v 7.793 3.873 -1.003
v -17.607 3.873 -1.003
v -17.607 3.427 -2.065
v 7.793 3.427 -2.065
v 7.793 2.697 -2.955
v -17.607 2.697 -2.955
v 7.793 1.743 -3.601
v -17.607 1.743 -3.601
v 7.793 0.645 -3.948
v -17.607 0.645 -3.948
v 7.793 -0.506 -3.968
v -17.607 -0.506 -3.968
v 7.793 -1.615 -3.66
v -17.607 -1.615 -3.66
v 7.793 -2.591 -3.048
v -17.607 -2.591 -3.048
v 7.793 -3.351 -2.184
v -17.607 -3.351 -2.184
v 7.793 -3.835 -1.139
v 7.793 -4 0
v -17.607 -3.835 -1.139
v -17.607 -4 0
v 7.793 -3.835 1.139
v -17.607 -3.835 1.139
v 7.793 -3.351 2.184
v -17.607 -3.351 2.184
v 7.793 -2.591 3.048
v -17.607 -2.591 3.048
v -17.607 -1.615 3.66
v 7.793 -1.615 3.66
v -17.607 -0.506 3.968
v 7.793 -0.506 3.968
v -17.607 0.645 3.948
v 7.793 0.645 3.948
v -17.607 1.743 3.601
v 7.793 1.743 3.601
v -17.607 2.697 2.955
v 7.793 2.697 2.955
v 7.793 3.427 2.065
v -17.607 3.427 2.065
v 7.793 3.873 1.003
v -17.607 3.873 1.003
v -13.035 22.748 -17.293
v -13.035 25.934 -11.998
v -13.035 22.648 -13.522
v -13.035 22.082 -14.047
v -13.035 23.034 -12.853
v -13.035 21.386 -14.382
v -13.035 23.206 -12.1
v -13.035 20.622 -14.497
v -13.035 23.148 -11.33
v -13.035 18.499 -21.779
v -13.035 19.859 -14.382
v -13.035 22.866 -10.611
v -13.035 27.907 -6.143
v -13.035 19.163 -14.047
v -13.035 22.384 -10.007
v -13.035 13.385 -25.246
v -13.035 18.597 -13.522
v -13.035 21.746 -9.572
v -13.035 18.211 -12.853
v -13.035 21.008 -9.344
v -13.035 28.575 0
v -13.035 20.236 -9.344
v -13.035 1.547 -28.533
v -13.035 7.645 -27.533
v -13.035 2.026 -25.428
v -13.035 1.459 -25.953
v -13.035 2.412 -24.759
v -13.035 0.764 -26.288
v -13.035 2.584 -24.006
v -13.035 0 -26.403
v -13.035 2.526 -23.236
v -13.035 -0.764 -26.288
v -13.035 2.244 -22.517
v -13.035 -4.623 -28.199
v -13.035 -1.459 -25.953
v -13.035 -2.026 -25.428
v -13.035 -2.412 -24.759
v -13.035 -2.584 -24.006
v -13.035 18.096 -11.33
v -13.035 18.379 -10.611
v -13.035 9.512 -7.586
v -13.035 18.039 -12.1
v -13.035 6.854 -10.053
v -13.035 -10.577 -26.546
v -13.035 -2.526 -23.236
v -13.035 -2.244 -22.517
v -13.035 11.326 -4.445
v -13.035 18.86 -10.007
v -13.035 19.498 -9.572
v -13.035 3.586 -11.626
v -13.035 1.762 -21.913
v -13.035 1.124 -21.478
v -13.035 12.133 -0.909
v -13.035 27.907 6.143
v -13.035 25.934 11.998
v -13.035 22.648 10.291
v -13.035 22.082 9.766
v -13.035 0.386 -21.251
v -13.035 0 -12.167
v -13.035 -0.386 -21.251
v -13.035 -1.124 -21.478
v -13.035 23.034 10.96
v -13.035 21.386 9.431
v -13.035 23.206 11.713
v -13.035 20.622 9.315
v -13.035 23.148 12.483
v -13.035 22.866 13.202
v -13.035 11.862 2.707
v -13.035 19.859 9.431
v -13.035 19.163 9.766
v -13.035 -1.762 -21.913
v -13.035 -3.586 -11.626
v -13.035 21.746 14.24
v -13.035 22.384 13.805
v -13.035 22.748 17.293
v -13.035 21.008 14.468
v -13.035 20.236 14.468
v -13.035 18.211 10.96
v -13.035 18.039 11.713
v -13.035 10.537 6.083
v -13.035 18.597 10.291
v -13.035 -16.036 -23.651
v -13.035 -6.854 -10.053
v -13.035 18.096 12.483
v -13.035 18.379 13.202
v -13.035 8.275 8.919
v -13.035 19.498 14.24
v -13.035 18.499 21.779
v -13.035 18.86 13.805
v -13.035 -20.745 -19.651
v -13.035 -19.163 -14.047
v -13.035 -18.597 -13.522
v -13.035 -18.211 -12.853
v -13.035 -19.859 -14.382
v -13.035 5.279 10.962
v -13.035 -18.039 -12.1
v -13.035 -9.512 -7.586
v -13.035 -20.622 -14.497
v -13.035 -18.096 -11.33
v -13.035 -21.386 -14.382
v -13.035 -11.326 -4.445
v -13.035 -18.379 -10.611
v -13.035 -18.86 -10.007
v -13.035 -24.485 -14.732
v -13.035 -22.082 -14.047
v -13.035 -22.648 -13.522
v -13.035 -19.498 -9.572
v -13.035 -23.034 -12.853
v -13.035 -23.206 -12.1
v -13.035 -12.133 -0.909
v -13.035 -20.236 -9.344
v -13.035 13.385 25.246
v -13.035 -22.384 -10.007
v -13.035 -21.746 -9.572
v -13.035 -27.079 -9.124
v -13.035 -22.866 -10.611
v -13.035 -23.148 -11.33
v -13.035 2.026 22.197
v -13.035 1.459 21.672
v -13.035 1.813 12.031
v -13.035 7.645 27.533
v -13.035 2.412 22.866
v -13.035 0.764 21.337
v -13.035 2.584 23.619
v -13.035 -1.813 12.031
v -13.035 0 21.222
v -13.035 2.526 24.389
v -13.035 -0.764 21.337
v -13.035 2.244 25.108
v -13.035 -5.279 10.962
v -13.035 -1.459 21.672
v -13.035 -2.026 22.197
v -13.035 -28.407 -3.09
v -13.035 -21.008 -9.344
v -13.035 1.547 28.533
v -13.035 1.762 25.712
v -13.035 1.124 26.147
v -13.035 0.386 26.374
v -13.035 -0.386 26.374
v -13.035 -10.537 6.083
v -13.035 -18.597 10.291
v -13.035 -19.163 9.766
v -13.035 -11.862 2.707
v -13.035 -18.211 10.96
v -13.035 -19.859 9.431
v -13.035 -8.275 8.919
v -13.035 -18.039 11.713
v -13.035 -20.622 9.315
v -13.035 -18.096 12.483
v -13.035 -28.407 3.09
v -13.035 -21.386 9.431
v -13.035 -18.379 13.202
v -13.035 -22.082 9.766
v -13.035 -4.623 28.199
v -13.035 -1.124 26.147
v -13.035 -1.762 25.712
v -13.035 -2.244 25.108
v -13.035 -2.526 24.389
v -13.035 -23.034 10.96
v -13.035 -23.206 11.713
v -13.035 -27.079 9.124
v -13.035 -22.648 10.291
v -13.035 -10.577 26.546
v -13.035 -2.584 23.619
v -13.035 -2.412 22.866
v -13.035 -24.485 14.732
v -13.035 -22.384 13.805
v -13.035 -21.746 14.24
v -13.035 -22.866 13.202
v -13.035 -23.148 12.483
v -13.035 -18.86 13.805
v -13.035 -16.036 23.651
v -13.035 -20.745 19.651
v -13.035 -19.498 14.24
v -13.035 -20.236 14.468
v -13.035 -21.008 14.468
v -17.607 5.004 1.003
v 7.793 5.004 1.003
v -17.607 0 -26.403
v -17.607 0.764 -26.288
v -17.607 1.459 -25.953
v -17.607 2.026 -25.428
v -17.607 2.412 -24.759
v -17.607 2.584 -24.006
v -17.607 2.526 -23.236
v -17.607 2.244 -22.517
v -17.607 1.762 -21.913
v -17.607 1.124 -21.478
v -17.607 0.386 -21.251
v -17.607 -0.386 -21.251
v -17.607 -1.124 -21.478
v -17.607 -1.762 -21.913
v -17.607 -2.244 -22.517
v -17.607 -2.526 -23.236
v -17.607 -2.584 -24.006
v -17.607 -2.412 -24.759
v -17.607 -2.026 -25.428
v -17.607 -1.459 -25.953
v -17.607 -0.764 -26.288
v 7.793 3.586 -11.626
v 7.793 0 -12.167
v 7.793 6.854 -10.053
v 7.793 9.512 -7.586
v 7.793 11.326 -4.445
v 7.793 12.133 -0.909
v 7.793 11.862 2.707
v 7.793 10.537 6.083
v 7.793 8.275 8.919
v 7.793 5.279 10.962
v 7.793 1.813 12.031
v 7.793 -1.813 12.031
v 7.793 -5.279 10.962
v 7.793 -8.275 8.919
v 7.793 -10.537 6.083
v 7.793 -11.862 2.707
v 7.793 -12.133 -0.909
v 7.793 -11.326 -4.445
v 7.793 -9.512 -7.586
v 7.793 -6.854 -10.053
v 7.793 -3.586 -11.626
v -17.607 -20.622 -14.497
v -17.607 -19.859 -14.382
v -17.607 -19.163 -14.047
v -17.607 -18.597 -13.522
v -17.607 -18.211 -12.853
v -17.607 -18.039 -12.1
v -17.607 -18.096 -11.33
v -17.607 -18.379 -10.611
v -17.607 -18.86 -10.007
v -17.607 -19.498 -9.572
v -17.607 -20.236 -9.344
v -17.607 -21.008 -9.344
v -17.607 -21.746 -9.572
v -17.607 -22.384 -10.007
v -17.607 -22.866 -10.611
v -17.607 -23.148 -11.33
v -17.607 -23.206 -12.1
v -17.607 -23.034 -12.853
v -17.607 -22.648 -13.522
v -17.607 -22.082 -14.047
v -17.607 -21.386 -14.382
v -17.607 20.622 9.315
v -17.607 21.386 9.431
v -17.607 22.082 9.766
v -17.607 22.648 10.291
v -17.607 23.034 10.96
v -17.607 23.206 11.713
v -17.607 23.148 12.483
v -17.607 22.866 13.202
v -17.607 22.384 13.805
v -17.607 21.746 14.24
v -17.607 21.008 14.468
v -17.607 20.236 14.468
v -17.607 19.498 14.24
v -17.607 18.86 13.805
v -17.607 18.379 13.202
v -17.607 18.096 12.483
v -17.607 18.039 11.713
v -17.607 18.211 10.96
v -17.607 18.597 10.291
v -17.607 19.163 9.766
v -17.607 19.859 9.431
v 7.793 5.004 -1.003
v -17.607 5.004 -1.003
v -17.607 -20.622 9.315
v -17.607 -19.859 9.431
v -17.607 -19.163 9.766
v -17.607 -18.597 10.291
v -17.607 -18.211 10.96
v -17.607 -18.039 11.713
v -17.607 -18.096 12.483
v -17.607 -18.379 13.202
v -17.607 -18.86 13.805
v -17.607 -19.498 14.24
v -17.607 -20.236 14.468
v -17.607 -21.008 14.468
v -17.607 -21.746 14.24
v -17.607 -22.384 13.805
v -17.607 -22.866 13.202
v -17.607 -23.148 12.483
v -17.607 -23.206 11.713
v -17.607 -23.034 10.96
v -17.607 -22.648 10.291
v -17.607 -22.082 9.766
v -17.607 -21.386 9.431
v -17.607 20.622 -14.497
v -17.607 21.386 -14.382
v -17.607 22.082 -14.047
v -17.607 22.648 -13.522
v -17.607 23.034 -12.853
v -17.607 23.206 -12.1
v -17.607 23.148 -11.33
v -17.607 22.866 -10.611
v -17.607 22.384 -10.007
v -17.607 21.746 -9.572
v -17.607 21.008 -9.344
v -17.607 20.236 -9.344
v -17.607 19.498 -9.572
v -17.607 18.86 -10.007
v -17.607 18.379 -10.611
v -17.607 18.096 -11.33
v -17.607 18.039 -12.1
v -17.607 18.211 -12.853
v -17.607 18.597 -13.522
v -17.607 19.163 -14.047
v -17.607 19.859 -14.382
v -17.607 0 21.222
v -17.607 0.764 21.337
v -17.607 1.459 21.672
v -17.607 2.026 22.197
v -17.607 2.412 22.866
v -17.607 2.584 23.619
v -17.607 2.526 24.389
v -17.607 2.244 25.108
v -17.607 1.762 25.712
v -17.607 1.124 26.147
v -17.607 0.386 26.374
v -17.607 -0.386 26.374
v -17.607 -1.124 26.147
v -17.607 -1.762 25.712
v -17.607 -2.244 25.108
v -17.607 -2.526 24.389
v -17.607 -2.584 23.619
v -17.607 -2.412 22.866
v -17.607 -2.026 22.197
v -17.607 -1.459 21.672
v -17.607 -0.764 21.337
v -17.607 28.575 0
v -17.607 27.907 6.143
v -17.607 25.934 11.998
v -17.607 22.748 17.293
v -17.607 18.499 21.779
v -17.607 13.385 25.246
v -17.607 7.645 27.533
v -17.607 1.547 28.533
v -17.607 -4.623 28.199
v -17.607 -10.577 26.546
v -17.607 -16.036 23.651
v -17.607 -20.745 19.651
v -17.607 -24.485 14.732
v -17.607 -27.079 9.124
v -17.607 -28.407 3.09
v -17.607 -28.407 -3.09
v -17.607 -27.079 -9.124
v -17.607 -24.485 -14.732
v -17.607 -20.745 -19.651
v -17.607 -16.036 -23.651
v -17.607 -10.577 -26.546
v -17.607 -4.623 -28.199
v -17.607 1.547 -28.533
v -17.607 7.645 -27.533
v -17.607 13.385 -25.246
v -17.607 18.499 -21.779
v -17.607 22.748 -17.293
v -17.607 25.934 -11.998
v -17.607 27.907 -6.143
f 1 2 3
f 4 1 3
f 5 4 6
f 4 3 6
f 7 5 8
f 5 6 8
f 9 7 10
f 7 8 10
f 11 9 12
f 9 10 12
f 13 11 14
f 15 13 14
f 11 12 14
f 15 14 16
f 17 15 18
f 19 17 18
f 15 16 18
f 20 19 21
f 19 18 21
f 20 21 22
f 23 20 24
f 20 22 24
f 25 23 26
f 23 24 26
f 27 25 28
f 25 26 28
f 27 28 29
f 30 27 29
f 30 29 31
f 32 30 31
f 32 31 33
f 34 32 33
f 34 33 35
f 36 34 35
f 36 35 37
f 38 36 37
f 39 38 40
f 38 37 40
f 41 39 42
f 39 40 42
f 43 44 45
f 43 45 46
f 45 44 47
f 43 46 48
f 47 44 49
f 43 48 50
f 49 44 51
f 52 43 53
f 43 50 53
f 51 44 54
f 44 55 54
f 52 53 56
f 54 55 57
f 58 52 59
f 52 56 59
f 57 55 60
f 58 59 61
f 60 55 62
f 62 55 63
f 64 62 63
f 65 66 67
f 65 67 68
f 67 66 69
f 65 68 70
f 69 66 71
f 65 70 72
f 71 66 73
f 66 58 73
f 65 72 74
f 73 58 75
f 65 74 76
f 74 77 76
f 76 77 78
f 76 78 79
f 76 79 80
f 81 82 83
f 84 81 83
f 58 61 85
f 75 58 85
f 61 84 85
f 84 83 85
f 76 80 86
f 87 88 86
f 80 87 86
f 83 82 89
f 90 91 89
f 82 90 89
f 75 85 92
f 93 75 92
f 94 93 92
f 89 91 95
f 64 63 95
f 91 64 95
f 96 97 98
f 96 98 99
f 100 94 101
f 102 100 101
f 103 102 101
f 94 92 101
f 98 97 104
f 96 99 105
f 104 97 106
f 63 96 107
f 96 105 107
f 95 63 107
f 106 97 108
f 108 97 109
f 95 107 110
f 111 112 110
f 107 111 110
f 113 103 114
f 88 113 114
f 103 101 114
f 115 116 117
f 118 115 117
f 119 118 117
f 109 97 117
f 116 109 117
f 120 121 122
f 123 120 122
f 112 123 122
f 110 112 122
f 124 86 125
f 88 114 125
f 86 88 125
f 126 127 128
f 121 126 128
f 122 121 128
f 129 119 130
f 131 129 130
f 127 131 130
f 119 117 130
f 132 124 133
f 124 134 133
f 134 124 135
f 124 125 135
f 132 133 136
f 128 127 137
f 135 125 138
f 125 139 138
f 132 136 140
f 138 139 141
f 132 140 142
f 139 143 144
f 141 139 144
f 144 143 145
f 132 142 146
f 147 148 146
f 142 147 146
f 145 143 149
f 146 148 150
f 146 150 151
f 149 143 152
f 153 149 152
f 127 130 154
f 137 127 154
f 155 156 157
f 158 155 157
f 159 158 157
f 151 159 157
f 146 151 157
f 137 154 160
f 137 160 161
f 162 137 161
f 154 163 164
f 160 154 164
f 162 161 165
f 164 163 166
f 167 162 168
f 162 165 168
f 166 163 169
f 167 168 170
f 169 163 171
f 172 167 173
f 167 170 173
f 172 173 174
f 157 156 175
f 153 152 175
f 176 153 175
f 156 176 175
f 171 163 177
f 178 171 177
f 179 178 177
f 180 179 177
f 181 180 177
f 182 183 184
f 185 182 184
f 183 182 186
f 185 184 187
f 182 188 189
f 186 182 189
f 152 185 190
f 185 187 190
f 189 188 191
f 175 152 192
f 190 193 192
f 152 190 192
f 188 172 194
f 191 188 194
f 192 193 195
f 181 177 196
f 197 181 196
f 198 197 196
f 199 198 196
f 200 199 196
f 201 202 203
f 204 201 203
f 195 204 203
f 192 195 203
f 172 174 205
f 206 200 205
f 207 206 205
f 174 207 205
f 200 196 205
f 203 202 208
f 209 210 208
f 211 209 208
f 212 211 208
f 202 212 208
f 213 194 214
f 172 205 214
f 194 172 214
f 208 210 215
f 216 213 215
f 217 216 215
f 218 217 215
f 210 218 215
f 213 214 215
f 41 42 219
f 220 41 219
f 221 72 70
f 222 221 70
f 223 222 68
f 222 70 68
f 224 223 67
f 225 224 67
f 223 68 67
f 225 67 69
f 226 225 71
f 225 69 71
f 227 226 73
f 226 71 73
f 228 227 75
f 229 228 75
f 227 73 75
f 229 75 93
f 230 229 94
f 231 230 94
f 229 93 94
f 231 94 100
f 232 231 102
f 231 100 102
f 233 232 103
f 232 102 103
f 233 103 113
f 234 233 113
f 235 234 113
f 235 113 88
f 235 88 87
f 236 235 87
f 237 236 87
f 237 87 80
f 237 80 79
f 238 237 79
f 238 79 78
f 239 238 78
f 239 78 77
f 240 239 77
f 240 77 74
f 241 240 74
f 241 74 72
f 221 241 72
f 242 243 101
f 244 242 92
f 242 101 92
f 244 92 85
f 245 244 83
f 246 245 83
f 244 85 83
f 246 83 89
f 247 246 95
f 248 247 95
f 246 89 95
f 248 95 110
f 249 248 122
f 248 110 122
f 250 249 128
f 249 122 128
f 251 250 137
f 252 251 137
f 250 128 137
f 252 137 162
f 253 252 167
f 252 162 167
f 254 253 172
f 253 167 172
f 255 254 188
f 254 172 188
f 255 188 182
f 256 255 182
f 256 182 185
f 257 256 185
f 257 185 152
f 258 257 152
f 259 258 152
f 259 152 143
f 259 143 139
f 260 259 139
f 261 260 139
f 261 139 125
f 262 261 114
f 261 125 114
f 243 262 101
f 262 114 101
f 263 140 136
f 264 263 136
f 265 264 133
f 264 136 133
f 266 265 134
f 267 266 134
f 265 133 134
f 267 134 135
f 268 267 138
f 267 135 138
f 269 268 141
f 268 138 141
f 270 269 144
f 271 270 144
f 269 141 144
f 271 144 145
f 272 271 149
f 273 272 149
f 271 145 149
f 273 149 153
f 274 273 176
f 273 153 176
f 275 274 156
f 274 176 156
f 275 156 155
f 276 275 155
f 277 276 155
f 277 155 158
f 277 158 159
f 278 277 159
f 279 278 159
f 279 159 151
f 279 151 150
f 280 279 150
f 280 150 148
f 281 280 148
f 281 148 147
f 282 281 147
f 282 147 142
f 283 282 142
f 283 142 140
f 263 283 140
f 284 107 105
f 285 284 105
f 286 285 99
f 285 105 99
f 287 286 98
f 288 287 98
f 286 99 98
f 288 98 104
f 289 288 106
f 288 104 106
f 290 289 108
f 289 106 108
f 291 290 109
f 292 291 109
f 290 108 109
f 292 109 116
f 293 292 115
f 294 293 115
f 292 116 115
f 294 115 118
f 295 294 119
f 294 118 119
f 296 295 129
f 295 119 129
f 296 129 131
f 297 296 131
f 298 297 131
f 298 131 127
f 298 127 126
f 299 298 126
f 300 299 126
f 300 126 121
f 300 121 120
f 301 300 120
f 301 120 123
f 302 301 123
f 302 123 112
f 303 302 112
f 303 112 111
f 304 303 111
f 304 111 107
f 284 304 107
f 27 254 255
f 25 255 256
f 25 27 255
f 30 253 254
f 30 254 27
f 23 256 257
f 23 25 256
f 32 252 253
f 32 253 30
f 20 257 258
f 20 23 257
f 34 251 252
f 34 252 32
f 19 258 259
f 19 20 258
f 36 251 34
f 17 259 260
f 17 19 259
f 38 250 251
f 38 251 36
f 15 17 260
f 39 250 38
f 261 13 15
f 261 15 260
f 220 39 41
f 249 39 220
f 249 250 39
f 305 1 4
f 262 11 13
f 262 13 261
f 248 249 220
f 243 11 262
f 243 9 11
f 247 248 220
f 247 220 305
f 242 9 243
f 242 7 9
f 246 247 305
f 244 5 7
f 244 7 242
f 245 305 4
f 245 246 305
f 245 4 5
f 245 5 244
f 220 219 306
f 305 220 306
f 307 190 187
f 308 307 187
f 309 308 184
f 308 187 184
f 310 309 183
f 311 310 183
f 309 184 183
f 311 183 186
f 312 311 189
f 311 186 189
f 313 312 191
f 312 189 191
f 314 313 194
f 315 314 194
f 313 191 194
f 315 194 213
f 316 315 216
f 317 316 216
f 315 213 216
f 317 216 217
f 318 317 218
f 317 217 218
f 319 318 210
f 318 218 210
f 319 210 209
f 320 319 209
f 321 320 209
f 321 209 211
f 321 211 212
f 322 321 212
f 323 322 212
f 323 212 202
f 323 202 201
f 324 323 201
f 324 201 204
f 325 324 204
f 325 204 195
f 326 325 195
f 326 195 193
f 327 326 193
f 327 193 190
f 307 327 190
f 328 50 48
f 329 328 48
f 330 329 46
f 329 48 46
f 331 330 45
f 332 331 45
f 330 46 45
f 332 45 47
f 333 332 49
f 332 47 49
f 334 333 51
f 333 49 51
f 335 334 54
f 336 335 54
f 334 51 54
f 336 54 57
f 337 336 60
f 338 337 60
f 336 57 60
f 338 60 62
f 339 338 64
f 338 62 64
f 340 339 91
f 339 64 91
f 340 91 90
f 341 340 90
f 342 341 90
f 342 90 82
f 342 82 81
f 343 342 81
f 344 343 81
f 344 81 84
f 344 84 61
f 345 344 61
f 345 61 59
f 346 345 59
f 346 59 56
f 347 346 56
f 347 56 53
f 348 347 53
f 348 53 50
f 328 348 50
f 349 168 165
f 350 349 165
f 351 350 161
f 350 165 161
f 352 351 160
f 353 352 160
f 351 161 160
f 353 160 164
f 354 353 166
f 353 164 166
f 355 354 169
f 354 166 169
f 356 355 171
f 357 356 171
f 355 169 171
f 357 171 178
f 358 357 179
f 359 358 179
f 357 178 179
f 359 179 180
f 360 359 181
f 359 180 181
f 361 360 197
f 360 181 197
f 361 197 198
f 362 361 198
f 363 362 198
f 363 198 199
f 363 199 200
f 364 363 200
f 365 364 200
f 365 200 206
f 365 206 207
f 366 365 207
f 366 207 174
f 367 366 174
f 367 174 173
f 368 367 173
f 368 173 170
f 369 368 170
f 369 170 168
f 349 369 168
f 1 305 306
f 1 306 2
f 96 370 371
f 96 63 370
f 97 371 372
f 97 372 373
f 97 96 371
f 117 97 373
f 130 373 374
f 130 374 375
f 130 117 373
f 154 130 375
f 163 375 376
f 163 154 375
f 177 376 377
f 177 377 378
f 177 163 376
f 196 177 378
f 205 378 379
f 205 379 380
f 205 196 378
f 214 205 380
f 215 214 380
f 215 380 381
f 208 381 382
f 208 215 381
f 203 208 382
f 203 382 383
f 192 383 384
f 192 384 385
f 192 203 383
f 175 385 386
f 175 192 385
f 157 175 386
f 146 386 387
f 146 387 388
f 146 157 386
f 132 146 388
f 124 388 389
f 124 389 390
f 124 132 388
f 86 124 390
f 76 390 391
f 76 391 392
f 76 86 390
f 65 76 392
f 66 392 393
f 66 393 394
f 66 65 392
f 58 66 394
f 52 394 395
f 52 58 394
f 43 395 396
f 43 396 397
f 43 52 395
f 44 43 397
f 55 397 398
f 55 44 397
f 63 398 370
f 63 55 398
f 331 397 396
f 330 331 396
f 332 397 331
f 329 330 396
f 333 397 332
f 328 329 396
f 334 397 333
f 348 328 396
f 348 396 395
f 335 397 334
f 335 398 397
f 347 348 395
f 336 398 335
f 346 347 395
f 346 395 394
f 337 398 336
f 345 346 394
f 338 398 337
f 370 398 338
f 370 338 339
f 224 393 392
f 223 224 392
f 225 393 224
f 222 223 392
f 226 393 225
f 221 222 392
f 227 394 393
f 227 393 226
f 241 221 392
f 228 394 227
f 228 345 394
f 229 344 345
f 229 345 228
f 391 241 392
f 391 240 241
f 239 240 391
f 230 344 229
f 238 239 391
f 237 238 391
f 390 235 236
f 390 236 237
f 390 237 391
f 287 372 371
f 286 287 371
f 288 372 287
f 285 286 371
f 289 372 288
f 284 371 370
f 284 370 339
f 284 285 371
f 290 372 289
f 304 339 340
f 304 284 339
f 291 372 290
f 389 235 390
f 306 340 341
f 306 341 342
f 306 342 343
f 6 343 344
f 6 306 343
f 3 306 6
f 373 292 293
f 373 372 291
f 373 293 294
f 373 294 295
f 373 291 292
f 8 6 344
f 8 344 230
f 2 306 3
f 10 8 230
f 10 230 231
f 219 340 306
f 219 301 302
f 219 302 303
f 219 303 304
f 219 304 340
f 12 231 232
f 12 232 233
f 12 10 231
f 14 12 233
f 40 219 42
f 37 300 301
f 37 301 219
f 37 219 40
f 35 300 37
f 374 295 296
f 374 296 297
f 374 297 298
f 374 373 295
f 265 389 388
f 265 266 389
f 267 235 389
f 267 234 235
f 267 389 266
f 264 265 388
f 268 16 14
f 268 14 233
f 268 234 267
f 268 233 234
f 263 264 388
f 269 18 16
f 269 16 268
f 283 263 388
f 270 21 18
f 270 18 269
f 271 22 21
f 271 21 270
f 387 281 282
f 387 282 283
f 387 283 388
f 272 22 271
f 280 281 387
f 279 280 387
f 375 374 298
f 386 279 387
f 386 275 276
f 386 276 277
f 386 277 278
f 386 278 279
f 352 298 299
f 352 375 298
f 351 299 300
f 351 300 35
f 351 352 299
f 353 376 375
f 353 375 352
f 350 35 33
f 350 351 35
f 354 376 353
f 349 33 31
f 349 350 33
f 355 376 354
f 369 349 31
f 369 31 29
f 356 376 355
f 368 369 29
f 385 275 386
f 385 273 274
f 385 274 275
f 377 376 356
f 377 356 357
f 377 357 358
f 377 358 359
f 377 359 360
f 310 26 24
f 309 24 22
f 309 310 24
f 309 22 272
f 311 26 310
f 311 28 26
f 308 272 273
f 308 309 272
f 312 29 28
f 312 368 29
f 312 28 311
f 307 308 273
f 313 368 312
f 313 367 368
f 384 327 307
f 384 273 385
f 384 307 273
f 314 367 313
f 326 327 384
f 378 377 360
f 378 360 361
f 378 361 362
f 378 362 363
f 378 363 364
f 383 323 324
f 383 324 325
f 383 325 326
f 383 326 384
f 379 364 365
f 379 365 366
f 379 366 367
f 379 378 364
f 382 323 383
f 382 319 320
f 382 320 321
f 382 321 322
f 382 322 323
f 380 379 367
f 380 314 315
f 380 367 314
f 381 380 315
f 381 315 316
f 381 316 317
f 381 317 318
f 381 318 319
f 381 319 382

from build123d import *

# Parameters (mm, degrees)
SKETCH1_W           = 4.572
SKETCH1_H           = 28.575
SKETCH2_R           = 12.1666
BOSS_EXTRUDE1_DEPTH = 20.828
CUT_EXTRUDE1_DEPTH  = 26.4
SKETCH4_W           = 25.4
SKETCH4_H           = 4.0005
HOLE1_D             = 5.1816
HOLE1_DEPTH         = 25.4


with BuildPart() as part:
    # Sketch1 → Revolve1 (revolve)
    with BuildSketch(Plane.XY):
        with Locations((-15.321066246, 14.2875)):
            Rectangle(SKETCH1_W, SKETCH1_H)
    revolve(axis=Axis((-17.607066246, 0, 0), (1, 0, 0)))

    # Sketch2 → Boss-Extrude1 (add)
    with BuildSketch(Plane(origin=(-13.035066246, 0, 0), x_dir=(0, 0, -1), z_dir=(1, 0, 0))):
        Circle(SKETCH2_R)
    extrude(amount=BOSS_EXTRUDE1_DEPTH)

    # Sketch3 → Cut-Extrude1 (cut, through all)
    with BuildSketch(Plane.ZY.offset(17.607066246)):
        with BuildLine():
            Line((1.0033, 3.872646299), (1.0033, 5.0038))
            Line((1.0033, 5.0038), (-1.0033, 5.0038))
            Line((-1.0033, 5.0038), (-1.0033, 3.872646299))
            ThreePointArc((-1.0033, 3.872646299), (0, 4.0005), (1.0033, 3.872646299))
        make_face()
    extrude(amount=-CUT_EXTRUDE1_DEPTH, mode=Mode.SUBTRACT)

    # Sketch4 → Cut-Revolve1 (revolve, cut)
    with BuildSketch(Plane(origin=(0, 0, 0), x_dir=(-1, 0, 0), z_dir=(0, 0, -1))):
        with Locations((4.907066246, 2.00025)):
            Rectangle(SKETCH4_W, SKETCH4_H)
    revolve(axis=Axis((7.792933754, 0, 0), (-1, 0, 0)), mode=Mode.SUBTRACT)

    # Hole1
    with Locations(Plane.ZY.offset(17.607066246)):
        with Locations((23.8125, 0), (11.90625, 20.622229928), (-11.90625, 20.622229928), (-23.8125, 0), (-11.90625, -20.622229928), (11.90625, -20.622229928)):
            Hole(HOLE1_D / 2, depth=HOLE1_DEPTH)


solid = part.part
